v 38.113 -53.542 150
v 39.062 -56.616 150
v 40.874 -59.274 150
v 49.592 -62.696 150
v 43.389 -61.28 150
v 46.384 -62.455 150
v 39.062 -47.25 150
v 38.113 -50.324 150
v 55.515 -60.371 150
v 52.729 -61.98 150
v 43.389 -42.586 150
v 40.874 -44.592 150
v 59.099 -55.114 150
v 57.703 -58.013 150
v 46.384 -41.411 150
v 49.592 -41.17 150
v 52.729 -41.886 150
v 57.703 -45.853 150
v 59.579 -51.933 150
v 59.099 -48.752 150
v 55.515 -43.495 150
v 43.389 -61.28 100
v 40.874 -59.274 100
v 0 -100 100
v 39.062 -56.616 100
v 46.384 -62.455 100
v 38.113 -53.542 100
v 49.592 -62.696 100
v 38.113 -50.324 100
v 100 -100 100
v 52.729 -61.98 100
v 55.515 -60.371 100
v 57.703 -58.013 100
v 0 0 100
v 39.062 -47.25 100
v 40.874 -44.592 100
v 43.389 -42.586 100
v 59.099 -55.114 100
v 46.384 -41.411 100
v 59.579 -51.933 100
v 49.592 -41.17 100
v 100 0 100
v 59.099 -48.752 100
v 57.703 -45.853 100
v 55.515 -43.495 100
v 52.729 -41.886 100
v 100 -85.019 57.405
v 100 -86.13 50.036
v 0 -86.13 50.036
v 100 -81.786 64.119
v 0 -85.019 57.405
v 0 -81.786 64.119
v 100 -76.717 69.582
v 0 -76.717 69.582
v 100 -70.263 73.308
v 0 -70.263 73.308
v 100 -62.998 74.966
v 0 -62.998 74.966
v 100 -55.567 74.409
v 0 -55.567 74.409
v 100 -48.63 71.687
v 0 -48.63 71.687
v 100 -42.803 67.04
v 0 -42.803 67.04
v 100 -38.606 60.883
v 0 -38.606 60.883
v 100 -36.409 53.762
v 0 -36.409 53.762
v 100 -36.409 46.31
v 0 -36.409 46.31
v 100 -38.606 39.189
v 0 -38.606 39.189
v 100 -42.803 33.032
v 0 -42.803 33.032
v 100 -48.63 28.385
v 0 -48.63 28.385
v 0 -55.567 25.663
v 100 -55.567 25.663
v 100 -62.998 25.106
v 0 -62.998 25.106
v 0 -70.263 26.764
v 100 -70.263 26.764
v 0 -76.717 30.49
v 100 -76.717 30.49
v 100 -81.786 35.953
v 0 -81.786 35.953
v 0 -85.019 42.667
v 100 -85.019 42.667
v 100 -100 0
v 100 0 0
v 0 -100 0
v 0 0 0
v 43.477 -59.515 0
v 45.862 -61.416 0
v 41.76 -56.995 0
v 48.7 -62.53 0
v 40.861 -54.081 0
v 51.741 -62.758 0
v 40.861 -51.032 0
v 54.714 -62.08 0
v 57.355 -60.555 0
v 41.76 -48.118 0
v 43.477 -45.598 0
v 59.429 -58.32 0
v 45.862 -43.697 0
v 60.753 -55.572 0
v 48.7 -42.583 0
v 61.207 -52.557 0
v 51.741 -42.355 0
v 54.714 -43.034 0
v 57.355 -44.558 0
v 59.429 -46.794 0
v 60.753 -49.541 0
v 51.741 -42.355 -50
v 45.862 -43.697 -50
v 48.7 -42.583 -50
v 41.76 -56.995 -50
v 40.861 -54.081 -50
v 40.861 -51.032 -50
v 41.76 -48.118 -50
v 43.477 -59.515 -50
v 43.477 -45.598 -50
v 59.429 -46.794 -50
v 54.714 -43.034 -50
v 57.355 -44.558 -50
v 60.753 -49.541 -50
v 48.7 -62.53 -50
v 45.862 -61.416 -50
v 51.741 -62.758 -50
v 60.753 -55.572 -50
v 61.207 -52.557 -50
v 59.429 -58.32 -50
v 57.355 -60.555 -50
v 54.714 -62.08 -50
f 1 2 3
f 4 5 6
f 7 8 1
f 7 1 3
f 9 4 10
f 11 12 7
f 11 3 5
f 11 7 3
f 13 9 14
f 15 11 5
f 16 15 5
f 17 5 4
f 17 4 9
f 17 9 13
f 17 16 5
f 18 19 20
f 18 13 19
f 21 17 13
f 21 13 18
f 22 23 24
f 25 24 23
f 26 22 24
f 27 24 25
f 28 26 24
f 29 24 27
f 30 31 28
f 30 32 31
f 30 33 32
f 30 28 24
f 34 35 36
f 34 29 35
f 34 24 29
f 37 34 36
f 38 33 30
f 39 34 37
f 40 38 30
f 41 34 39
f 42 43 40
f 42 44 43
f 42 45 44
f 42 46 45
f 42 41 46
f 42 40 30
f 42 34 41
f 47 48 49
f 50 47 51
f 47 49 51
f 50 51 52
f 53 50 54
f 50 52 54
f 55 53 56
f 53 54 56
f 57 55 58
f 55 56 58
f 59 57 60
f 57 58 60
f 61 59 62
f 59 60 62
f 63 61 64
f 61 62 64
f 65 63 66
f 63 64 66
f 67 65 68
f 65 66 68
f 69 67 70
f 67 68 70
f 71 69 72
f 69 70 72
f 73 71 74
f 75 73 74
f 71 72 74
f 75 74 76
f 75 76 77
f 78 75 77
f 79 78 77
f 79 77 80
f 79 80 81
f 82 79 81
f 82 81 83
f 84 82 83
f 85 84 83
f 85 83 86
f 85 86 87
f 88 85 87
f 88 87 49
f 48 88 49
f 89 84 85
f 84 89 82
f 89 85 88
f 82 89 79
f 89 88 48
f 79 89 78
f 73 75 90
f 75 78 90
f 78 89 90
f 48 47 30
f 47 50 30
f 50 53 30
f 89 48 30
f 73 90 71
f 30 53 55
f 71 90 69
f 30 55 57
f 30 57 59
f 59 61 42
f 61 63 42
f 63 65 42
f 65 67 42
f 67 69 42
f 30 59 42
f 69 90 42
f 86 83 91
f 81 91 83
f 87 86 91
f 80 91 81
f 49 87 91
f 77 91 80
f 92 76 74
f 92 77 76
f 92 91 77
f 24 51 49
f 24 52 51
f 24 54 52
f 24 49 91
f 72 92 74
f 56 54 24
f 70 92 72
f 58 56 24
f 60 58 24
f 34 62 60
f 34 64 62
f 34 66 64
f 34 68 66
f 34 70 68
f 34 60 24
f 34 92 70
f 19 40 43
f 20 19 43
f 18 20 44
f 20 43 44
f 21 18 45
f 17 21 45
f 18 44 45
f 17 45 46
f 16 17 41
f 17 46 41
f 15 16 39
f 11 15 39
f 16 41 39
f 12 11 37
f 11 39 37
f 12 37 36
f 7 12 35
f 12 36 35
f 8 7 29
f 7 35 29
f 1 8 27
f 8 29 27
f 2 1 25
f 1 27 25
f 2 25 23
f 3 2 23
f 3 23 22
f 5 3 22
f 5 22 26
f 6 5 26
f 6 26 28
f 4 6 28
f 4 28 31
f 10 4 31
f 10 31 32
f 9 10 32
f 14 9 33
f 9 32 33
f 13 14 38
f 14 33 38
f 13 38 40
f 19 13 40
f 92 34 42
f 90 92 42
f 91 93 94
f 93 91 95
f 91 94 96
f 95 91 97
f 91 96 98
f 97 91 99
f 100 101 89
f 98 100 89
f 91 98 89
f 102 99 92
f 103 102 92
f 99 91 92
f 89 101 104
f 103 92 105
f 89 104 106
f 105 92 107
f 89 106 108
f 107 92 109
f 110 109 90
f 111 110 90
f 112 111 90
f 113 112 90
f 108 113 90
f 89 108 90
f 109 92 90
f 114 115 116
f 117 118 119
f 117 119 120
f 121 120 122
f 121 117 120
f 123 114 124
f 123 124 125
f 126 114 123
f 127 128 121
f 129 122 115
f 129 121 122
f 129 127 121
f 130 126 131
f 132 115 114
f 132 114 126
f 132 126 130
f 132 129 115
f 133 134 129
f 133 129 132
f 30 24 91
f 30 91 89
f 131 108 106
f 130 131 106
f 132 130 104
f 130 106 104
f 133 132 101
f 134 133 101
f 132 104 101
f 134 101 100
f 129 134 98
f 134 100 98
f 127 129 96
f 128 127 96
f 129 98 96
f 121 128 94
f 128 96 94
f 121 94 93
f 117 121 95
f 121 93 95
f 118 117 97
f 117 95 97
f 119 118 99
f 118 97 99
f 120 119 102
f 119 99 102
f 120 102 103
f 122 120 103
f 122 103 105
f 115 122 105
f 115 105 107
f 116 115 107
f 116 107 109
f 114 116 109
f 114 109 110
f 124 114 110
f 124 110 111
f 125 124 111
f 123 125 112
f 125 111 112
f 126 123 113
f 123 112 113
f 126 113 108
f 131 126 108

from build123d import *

# Parameters (mm, degrees)
F0_W     = 99.999961
F0_H     = 100
F1_DEPTH = 100
F2_R     = 10.792816
F3_DEPTH = 50
F5_R     = 10.230309
F6_DEPTH = 50
F8_D     = 50


with BuildPart() as f1:
    # F0 (on Front) → F1 (new body)
    with BuildSketch(Plane.XZ):
        with Locations((49.99998, 50)):
            Rectangle(F0_W, F0_H)
    extrude(amount=F1_DEPTH)

    # F2 (on face) → F3 (join)
    with BuildSketch(Plane.XY.offset(100)):
        with Locations((48.785694, -51.932942)):
            Circle(F2_R)
    extrude(amount=F3_DEPTH)

    # F5 (on face) → F6 (join)
    with BuildSketch(Plane(origin=(0, 0, 0), x_dir=(1, 0, 0), z_dir=(0, 0, -1))):
        with Locations((50.976809, 52.556667)):
            Circle(F5_R)
    extrude(amount=F6_DEPTH)

    # F8 (through all)
    with Locations(Plane.YZ.offset(99.999961)):
        with Locations((-61.129767, 50.035987)):
            Hole(F8_D / 2)


solid = f1.part
